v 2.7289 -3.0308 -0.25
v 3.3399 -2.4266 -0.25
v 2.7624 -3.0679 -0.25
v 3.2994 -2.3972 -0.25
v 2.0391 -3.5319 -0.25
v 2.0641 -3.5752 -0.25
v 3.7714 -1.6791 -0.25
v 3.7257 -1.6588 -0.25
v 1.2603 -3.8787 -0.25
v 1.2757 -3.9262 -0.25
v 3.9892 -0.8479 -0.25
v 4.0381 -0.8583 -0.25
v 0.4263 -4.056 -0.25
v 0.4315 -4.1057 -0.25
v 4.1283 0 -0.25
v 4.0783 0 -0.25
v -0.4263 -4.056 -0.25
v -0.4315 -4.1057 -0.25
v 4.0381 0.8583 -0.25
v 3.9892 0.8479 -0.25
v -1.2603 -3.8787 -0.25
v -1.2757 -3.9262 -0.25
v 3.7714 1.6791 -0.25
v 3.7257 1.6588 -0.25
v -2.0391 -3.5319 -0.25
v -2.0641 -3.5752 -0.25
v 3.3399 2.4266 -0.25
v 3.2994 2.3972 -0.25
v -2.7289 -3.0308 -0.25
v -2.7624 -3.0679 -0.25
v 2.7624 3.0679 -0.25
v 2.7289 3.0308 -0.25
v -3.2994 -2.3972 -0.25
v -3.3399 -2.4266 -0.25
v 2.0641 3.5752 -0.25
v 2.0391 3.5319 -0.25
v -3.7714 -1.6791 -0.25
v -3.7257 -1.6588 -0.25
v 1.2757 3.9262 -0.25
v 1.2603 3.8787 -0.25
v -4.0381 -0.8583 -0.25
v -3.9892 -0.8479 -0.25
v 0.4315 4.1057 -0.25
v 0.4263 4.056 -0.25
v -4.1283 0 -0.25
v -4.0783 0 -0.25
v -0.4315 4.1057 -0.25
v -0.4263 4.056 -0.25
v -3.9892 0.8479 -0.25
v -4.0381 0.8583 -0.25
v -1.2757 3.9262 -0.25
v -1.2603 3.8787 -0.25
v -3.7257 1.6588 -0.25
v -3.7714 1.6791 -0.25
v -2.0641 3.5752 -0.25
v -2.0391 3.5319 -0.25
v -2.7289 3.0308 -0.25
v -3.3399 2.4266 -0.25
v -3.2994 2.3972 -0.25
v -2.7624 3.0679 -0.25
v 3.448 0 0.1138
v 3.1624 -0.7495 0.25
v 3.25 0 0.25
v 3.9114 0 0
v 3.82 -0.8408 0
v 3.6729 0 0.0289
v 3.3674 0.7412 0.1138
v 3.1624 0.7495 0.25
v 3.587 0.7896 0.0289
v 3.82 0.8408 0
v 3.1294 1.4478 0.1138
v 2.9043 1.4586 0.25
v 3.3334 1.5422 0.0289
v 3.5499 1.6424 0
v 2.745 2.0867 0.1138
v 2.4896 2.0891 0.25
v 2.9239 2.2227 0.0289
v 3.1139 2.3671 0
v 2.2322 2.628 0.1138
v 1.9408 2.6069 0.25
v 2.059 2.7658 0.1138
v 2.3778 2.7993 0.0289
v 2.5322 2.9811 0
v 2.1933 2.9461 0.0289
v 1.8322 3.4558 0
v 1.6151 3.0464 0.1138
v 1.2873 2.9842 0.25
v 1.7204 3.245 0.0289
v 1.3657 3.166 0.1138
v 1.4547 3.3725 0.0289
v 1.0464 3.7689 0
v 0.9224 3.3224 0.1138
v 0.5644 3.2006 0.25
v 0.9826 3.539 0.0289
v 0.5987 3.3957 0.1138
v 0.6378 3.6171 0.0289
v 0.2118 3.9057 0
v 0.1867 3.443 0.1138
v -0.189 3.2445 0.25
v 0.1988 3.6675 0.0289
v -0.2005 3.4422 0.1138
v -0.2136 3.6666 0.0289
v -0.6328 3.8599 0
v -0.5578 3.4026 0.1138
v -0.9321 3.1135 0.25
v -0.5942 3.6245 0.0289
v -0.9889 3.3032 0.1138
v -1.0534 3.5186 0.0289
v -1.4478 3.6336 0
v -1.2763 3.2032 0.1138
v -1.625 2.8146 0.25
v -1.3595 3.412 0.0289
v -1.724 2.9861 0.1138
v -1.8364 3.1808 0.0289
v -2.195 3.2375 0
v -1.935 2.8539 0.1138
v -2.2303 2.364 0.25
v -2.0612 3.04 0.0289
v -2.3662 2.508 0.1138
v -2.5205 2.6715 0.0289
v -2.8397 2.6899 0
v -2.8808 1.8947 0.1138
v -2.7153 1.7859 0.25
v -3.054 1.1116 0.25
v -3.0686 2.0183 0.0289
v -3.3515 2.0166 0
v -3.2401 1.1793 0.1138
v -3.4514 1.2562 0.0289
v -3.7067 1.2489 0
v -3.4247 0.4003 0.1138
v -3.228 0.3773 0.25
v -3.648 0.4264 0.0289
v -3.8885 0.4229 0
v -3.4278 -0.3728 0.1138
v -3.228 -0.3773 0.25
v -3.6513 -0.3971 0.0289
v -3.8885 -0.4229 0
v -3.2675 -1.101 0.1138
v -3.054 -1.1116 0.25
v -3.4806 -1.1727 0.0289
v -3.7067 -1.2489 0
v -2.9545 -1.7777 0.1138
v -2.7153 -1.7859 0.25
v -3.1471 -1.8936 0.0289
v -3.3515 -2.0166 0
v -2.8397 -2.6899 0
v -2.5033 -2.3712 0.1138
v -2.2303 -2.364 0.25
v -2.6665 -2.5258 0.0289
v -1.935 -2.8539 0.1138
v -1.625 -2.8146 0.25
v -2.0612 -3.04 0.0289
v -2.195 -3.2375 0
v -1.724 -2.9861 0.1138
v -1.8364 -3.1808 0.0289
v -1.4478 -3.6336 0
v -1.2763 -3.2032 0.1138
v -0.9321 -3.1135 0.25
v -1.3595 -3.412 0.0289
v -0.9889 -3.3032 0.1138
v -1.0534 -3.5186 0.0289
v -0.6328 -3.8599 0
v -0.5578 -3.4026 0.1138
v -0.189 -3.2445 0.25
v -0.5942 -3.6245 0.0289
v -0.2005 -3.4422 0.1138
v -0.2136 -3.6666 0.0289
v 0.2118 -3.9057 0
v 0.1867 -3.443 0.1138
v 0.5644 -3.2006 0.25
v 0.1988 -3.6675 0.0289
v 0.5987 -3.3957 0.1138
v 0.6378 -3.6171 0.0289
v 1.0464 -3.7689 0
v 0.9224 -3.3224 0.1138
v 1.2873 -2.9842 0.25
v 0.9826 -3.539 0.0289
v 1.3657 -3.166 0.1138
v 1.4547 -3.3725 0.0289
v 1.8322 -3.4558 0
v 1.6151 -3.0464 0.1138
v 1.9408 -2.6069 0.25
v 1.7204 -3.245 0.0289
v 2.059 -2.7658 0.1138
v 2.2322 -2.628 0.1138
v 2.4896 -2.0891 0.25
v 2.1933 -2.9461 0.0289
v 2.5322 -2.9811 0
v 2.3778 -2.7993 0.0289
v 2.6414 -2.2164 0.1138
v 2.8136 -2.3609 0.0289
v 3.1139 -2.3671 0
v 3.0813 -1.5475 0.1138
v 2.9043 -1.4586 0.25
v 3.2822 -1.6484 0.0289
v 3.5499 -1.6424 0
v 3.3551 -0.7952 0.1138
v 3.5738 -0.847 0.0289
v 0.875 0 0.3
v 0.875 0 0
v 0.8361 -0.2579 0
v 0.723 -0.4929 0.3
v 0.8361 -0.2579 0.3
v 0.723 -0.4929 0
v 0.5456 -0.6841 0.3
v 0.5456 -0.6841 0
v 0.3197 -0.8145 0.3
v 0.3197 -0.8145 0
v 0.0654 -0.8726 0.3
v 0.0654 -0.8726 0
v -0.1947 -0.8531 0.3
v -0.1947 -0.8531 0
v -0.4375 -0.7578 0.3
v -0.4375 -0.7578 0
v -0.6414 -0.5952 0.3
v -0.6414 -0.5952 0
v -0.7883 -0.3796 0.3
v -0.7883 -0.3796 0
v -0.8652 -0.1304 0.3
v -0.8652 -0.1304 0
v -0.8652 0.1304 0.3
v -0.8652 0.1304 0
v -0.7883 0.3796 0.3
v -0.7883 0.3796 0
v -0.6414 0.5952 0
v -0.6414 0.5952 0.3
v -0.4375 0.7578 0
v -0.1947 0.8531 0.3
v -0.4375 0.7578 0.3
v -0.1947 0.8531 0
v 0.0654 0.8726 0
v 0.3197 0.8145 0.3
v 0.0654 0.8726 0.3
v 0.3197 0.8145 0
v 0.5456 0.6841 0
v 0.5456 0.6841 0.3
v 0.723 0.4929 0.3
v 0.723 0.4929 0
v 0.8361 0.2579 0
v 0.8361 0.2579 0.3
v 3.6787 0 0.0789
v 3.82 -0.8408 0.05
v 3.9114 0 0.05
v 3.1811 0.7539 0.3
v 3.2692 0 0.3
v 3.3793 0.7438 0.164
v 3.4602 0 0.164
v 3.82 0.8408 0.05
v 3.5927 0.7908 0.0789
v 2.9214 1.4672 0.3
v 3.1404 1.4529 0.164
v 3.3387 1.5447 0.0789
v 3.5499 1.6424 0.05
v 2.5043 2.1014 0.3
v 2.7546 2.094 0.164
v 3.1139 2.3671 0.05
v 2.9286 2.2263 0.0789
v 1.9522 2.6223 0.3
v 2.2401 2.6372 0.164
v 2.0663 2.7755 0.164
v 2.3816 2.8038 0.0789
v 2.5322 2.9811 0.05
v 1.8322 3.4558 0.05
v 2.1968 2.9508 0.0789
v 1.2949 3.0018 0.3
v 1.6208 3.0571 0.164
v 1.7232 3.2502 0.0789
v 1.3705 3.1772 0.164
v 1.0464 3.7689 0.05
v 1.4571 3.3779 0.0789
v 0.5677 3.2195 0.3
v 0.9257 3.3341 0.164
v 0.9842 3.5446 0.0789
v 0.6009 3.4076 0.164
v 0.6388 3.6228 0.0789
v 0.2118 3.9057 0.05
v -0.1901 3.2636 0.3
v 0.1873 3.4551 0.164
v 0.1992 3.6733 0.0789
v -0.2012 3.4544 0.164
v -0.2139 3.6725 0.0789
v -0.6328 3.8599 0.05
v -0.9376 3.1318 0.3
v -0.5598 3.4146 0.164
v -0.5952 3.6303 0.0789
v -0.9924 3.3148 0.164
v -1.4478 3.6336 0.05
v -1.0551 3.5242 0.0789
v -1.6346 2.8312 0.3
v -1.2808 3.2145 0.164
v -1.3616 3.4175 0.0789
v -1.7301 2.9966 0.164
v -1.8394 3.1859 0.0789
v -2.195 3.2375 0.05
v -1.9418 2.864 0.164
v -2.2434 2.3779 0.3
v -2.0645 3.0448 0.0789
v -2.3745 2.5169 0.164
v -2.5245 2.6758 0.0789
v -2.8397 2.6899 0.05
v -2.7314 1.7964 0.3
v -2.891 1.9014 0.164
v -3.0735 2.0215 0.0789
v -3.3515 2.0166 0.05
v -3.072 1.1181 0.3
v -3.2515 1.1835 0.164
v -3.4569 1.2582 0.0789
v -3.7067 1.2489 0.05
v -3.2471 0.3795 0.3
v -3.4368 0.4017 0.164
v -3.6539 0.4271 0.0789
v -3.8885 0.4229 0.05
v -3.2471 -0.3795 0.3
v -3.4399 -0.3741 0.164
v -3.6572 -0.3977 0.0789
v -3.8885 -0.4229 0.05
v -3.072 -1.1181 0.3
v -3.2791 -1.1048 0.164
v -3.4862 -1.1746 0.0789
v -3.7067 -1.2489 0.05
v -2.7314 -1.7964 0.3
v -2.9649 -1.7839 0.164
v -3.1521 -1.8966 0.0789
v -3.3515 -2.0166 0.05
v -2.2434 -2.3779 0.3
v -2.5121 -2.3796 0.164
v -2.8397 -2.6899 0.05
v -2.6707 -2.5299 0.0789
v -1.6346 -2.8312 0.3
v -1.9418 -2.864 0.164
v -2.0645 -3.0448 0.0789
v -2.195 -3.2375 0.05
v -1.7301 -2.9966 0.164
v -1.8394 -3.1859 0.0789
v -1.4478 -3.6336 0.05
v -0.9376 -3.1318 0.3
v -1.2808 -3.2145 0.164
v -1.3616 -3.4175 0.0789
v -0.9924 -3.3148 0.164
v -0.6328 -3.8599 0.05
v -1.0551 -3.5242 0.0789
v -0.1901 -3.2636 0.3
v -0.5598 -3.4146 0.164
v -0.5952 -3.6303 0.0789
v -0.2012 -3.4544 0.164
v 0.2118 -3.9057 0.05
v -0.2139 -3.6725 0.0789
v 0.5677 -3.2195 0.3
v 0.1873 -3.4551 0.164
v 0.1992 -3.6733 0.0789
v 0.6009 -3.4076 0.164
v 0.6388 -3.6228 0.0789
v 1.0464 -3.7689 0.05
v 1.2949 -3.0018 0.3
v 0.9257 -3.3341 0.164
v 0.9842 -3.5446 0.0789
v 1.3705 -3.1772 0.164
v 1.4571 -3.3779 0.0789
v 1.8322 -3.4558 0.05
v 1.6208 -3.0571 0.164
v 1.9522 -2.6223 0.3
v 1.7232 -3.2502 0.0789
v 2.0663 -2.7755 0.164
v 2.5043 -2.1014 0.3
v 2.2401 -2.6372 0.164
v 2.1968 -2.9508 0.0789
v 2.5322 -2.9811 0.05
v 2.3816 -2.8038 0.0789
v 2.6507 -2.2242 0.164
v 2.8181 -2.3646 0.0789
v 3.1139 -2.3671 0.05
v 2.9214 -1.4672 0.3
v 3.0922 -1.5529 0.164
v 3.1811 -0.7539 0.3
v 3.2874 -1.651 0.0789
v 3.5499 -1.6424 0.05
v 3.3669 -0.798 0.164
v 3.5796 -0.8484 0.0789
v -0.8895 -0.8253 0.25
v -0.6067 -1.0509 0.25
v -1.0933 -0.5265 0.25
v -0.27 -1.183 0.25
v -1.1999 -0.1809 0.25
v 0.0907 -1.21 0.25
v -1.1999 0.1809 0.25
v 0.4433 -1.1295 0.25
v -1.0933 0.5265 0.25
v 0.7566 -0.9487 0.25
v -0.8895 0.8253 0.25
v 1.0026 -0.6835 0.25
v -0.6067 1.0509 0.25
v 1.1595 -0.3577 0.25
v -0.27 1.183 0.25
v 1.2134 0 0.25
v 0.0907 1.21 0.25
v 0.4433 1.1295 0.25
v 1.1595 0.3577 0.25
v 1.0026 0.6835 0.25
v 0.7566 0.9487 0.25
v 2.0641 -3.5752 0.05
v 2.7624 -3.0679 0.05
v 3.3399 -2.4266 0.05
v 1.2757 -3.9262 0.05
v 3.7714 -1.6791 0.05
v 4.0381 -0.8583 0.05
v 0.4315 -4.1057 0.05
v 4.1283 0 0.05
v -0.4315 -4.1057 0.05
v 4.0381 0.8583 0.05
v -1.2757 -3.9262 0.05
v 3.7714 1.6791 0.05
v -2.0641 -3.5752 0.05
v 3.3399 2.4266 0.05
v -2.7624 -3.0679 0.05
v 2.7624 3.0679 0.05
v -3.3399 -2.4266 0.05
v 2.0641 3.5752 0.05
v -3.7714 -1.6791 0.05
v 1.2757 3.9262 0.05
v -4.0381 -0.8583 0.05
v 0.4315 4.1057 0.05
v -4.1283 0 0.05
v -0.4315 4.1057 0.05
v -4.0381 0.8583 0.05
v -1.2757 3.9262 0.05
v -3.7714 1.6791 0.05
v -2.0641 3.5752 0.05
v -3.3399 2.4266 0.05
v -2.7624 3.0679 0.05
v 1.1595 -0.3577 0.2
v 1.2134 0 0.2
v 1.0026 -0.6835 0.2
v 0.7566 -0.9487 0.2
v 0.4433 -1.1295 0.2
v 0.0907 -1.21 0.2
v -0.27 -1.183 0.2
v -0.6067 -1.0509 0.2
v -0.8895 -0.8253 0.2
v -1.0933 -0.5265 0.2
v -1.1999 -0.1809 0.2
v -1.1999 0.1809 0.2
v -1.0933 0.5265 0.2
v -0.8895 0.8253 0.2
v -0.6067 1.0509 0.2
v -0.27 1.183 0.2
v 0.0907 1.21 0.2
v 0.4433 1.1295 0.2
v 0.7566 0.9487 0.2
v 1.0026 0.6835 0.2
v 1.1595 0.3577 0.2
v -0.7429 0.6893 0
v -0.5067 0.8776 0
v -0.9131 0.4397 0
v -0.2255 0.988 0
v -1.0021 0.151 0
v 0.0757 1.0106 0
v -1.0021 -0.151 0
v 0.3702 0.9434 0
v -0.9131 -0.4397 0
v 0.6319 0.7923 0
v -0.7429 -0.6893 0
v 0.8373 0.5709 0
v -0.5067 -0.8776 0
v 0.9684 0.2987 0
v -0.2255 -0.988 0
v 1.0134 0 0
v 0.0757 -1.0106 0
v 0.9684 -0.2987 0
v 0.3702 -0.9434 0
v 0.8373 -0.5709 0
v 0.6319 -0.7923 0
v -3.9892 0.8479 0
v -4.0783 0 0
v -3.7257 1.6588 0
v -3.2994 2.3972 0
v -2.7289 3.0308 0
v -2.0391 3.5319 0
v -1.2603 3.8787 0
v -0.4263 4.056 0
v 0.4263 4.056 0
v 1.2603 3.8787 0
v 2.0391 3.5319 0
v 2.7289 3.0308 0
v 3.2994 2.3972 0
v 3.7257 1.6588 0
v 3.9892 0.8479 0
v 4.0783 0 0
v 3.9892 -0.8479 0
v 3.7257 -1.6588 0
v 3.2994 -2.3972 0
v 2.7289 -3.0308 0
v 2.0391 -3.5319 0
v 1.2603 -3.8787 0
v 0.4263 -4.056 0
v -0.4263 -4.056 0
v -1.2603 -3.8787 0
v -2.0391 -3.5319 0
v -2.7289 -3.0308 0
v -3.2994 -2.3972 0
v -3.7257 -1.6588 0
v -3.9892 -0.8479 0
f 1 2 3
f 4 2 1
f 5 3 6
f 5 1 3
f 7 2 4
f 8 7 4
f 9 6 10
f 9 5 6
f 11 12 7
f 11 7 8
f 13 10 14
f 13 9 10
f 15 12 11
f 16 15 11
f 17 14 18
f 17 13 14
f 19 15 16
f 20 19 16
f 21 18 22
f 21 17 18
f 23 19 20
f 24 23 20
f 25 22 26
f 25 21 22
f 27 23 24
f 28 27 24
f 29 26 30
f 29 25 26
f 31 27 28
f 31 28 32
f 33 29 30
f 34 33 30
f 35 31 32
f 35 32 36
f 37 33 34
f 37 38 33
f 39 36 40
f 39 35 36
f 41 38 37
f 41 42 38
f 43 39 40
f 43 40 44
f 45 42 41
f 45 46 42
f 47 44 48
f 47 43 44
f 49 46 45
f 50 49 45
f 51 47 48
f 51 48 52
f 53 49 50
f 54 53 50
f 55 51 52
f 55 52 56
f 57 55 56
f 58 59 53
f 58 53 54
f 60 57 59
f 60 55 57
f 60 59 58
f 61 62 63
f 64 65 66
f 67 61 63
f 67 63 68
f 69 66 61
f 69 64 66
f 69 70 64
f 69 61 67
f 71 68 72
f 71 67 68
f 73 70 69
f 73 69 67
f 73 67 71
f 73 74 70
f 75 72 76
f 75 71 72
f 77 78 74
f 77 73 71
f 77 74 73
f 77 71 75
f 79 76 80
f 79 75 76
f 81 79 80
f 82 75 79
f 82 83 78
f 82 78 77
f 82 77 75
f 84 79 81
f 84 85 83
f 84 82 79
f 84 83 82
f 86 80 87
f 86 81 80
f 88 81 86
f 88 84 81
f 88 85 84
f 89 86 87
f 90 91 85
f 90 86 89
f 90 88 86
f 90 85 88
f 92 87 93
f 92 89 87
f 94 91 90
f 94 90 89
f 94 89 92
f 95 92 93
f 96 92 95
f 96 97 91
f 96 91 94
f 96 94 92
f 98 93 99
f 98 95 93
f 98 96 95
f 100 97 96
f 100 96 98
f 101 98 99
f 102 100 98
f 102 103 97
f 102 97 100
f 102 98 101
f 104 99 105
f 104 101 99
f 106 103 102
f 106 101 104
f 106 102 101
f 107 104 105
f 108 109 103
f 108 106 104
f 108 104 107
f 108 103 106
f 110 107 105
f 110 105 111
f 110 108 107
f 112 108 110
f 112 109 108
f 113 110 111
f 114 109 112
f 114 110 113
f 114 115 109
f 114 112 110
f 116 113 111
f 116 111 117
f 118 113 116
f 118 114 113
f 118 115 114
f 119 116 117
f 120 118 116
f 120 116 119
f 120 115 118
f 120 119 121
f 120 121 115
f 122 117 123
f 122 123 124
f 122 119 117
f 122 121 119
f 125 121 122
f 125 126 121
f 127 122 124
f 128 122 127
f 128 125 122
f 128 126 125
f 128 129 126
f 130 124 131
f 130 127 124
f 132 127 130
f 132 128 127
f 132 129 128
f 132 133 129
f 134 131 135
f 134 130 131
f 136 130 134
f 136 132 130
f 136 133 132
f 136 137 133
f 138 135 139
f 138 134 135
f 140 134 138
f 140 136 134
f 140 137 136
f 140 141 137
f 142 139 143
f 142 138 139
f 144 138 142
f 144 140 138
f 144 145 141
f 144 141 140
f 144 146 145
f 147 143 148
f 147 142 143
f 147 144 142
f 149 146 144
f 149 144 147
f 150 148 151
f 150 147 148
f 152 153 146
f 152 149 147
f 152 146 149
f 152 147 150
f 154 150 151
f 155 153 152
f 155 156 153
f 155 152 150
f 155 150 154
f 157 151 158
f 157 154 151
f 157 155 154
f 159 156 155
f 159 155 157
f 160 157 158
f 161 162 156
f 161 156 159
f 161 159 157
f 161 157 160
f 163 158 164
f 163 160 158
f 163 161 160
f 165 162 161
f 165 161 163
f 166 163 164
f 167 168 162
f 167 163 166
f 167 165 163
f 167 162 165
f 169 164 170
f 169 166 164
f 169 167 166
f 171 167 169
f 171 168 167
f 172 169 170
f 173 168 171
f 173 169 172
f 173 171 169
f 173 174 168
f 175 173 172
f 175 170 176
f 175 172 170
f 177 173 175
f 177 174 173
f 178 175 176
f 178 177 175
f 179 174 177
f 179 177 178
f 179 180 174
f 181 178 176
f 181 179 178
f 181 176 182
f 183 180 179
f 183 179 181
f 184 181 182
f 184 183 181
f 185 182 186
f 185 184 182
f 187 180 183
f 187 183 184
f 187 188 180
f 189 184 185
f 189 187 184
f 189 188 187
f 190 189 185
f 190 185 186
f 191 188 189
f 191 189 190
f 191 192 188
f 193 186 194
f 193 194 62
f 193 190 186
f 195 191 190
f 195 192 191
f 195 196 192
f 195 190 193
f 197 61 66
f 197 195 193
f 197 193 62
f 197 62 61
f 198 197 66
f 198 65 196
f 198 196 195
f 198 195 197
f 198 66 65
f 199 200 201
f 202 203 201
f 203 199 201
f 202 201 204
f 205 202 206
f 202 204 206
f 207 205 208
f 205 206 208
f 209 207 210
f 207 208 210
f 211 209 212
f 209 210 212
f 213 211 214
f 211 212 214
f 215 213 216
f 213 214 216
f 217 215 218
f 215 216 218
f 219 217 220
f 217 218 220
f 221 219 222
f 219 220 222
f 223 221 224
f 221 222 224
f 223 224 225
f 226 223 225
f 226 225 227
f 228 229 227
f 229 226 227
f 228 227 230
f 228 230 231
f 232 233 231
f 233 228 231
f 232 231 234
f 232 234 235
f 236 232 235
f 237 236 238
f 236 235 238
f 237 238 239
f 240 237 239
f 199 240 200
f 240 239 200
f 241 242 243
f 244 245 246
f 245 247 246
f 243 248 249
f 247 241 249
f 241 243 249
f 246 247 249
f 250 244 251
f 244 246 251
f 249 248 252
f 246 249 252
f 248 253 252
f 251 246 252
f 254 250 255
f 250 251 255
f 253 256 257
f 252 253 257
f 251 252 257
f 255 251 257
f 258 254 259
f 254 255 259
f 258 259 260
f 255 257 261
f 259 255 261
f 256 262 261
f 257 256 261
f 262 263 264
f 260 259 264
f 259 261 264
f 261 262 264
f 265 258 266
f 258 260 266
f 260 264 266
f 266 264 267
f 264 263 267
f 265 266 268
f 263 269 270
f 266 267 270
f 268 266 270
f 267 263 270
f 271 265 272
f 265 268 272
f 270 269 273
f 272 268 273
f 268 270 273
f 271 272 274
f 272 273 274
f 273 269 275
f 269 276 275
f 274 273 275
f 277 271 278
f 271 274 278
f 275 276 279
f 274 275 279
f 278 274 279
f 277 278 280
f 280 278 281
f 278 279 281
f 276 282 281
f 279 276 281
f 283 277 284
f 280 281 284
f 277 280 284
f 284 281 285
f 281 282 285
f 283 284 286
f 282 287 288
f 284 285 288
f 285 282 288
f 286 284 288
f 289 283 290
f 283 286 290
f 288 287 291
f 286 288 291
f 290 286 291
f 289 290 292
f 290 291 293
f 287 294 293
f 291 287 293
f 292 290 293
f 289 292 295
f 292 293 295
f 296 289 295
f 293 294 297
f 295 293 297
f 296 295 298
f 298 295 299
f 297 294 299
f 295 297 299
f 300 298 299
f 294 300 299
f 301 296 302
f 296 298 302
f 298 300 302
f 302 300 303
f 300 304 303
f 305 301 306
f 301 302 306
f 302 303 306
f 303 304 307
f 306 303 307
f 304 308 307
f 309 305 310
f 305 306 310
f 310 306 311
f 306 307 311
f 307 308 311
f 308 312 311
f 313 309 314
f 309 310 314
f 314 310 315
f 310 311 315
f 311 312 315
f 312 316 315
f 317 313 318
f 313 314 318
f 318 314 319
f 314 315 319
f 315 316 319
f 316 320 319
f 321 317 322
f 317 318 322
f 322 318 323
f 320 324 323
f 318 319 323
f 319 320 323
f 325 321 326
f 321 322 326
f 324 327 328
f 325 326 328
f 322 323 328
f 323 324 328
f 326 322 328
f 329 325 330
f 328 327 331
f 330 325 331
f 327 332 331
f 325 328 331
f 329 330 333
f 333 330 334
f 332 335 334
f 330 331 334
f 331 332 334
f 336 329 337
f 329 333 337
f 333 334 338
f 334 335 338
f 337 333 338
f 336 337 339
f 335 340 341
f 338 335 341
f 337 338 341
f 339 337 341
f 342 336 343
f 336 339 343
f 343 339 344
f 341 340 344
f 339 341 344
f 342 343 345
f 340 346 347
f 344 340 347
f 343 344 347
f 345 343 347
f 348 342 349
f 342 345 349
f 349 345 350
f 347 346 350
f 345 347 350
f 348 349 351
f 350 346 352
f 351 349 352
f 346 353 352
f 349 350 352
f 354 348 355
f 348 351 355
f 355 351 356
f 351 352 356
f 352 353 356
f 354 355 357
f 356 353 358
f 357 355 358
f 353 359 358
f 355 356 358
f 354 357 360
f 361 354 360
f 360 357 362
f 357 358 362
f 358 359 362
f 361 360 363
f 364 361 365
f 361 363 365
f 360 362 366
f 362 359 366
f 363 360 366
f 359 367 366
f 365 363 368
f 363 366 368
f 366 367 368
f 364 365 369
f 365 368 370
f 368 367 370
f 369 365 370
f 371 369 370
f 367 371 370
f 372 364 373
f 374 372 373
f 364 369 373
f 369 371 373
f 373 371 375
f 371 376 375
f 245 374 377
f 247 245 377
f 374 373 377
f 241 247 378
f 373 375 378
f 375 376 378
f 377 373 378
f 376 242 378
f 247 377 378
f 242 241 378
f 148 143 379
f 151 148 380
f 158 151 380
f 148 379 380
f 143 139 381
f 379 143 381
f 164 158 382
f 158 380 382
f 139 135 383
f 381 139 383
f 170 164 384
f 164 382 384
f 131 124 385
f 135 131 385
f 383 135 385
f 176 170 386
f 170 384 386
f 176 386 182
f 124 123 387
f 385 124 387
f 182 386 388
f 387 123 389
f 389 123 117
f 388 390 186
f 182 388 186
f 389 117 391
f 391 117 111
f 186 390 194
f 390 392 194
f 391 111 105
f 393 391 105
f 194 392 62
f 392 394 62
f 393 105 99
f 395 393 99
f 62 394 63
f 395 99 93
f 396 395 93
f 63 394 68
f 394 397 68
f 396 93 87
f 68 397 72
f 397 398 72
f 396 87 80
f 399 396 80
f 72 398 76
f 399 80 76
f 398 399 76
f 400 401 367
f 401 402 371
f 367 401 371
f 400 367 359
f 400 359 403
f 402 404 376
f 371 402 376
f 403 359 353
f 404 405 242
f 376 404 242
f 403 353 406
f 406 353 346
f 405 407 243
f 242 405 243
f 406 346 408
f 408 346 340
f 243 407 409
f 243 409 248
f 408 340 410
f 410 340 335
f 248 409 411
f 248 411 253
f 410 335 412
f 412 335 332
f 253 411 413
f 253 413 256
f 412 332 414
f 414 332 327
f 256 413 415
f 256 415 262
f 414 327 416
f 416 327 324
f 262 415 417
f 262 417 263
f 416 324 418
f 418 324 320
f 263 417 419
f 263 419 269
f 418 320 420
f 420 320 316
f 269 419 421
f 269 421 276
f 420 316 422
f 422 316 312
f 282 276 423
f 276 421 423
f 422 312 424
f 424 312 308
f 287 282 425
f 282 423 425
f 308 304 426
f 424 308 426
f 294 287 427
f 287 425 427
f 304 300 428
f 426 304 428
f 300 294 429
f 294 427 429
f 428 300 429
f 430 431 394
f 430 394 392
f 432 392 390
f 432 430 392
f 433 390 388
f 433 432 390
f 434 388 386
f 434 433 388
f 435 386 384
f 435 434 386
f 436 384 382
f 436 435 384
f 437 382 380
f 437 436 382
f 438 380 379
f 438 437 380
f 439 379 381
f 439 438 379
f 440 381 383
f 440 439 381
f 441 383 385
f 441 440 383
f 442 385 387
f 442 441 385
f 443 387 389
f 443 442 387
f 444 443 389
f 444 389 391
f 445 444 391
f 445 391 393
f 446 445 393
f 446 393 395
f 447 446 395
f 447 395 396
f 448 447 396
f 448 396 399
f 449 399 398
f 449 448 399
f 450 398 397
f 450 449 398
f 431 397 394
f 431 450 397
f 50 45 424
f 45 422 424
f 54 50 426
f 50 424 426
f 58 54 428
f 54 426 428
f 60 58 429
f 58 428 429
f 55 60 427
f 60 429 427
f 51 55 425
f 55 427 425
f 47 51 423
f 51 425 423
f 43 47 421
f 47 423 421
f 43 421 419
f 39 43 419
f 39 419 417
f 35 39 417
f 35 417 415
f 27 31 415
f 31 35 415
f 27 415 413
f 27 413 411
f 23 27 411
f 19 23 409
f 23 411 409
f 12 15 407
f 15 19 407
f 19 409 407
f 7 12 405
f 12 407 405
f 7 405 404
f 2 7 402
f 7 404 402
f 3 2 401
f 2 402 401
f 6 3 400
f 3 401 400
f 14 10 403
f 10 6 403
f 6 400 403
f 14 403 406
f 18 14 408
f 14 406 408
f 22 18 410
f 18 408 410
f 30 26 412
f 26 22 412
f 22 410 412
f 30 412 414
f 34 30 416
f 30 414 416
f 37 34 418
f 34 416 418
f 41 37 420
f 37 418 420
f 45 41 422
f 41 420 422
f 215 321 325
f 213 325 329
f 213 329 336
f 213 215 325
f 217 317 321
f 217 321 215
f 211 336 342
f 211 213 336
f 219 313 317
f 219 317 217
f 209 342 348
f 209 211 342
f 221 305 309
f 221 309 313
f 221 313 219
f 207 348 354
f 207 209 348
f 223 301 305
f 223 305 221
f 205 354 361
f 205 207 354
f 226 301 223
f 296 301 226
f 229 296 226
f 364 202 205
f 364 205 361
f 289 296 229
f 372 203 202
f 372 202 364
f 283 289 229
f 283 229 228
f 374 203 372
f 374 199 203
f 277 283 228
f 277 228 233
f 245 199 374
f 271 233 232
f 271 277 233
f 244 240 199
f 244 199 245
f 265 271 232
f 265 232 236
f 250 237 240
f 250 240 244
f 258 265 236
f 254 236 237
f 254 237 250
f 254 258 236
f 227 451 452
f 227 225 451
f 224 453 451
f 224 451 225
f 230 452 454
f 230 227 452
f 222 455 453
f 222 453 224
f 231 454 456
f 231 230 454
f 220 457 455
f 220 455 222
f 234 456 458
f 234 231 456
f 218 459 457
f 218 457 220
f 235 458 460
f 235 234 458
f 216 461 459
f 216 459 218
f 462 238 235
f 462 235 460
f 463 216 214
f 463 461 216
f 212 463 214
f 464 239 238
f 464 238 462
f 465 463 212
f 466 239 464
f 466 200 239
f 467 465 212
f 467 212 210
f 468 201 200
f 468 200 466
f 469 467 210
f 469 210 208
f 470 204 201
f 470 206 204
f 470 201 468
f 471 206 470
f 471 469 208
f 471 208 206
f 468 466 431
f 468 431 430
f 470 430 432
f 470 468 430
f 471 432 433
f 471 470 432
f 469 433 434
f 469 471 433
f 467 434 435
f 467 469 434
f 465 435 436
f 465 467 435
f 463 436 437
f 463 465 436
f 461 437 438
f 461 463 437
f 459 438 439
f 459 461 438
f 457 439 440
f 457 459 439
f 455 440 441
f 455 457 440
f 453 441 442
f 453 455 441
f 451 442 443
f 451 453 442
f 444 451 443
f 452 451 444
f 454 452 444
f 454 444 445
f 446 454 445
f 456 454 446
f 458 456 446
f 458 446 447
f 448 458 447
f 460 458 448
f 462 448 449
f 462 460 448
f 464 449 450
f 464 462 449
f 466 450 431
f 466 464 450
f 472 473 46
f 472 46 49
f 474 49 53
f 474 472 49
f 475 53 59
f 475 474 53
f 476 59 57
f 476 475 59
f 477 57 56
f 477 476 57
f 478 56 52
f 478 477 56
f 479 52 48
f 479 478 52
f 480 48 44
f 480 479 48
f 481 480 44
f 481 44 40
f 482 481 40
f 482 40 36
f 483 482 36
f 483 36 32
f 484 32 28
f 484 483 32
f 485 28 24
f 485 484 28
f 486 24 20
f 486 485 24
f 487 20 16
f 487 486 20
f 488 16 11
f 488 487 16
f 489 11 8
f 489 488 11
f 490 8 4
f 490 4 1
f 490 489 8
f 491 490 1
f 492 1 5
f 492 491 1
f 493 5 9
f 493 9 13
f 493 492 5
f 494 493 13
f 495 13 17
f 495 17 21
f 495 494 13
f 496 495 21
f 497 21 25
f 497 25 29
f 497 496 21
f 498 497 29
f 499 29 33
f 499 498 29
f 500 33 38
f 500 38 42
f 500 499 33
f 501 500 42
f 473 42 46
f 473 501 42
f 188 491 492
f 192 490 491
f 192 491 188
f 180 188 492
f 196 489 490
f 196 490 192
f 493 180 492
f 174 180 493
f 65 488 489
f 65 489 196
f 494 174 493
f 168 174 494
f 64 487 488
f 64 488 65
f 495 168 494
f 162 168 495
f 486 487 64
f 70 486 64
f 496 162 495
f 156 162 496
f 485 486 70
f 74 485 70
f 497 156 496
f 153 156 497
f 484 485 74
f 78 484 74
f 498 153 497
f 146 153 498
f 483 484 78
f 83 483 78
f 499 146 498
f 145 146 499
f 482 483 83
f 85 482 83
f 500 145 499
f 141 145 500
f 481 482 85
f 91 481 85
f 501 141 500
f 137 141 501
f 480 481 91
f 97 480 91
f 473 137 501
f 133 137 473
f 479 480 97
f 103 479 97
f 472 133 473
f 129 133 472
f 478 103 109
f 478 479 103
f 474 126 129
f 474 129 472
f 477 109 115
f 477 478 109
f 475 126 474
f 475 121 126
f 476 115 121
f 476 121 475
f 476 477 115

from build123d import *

# Parameters (mm, degrees)
SKETCH1_R           = 3.25
SKETCH1_R_2         = 0.875
BOSS_EXTRUDE1_DEPTH = 0.25
SKETCH2_R           = 4.078298916
BOSS_EXTRUDE2_DEPTH = 0.25
FILLET1_R           = 1
SHELL1_T            = 0.05
CUT_EXTRUDE1_START  = -2.25
SKETCH3_R           = 0.875
CUT_EXTRUDE1_DEPTH  = 2.25
BOSS_EXTRUDE3_START = 0.25
SKETCH4_R           = 1.213418459
SKETCH4_R_2         = 0.875
BOSS_EXTRUDE3_DEPTH = 0.25
CHAMFER1_SIZE       = 0.2


with BuildPart() as part:
    # Sketch1 → Boss-Extrude1 (new body)
    with BuildSketch(Plane.XY):
        Circle(SKETCH1_R)
        Circle(SKETCH1_R_2, mode=Mode.SUBTRACT)
    extrude(amount=BOSS_EXTRUDE1_DEPTH)

    # Sketch2 → Boss-Extrude2 (add)
    with BuildSketch(Plane(origin=(0, 0, 0), x_dir=(-1, 0, 0), z_dir=(0, 0, -1))):
        Circle(SKETCH2_R)
    extrude(amount=BOSS_EXTRUDE2_DEPTH)

    # Fillet1
    # the kernel refuses this fillet: 1 mm, written as the material it adds along each edge
    with BuildSketch(Plane(origin=(0, 0, 0), x_dir=(1, 0, 0), z_dir=(0, -1, 0))) as fillet1_piece_1:
        with BuildLine():
            CenterArc((3.911437828, 1), FILLET1_R, 228.590377891, 41.409622109)
            Line((3.25, 0.25), (3.25, 0))
            Line((3.25, 0), (3.911437828, 0))
        make_face()
    revolve(axis=Axis((0, 0, 0), (0, 0, 1)))

    # Shell1
    shell1_openings = [part.faces().sort_by_distance(p)[0] for p in [
        (0, 0, -0.25),
    ]]
    offset(amount=SHELL1_T, openings=shell1_openings, kind=Kind.INTERSECTION)

    # Sketch3 → Cut-Extrude1 (cut)
    with BuildSketch(Plane.XY.offset(0.3).offset(CUT_EXTRUDE1_START)):
        Circle(SKETCH3_R)
    extrude(amount=CUT_EXTRUDE1_DEPTH, mode=Mode.SUBTRACT)

    # Sketch4 → Boss-Extrude3 (add)
    with BuildSketch(Plane(origin=(0, 0, 0.25), x_dir=(-1, 0, 0), z_dir=(0, 0, -1)).offset(BOSS_EXTRUDE3_START)):
        with Locations(Location((0, 0, 0), (0, 0, 180))):
            Circle(SKETCH4_R)
        with Locations(Location((0, 0, 0), (0, 0, 180))):
            Circle(SKETCH4_R_2, mode=Mode.SUBTRACT)
    extrude(amount=-BOSS_EXTRUDE3_DEPTH)

    # Chamfer1
    chamfer1_edges = [part.edges().sort_by_distance(p)[0] for p in [
        (-1.213418459, 0, 0),
    ]]
    chamfer(chamfer1_edges, length=CHAMFER1_SIZE)


solid = part.part
